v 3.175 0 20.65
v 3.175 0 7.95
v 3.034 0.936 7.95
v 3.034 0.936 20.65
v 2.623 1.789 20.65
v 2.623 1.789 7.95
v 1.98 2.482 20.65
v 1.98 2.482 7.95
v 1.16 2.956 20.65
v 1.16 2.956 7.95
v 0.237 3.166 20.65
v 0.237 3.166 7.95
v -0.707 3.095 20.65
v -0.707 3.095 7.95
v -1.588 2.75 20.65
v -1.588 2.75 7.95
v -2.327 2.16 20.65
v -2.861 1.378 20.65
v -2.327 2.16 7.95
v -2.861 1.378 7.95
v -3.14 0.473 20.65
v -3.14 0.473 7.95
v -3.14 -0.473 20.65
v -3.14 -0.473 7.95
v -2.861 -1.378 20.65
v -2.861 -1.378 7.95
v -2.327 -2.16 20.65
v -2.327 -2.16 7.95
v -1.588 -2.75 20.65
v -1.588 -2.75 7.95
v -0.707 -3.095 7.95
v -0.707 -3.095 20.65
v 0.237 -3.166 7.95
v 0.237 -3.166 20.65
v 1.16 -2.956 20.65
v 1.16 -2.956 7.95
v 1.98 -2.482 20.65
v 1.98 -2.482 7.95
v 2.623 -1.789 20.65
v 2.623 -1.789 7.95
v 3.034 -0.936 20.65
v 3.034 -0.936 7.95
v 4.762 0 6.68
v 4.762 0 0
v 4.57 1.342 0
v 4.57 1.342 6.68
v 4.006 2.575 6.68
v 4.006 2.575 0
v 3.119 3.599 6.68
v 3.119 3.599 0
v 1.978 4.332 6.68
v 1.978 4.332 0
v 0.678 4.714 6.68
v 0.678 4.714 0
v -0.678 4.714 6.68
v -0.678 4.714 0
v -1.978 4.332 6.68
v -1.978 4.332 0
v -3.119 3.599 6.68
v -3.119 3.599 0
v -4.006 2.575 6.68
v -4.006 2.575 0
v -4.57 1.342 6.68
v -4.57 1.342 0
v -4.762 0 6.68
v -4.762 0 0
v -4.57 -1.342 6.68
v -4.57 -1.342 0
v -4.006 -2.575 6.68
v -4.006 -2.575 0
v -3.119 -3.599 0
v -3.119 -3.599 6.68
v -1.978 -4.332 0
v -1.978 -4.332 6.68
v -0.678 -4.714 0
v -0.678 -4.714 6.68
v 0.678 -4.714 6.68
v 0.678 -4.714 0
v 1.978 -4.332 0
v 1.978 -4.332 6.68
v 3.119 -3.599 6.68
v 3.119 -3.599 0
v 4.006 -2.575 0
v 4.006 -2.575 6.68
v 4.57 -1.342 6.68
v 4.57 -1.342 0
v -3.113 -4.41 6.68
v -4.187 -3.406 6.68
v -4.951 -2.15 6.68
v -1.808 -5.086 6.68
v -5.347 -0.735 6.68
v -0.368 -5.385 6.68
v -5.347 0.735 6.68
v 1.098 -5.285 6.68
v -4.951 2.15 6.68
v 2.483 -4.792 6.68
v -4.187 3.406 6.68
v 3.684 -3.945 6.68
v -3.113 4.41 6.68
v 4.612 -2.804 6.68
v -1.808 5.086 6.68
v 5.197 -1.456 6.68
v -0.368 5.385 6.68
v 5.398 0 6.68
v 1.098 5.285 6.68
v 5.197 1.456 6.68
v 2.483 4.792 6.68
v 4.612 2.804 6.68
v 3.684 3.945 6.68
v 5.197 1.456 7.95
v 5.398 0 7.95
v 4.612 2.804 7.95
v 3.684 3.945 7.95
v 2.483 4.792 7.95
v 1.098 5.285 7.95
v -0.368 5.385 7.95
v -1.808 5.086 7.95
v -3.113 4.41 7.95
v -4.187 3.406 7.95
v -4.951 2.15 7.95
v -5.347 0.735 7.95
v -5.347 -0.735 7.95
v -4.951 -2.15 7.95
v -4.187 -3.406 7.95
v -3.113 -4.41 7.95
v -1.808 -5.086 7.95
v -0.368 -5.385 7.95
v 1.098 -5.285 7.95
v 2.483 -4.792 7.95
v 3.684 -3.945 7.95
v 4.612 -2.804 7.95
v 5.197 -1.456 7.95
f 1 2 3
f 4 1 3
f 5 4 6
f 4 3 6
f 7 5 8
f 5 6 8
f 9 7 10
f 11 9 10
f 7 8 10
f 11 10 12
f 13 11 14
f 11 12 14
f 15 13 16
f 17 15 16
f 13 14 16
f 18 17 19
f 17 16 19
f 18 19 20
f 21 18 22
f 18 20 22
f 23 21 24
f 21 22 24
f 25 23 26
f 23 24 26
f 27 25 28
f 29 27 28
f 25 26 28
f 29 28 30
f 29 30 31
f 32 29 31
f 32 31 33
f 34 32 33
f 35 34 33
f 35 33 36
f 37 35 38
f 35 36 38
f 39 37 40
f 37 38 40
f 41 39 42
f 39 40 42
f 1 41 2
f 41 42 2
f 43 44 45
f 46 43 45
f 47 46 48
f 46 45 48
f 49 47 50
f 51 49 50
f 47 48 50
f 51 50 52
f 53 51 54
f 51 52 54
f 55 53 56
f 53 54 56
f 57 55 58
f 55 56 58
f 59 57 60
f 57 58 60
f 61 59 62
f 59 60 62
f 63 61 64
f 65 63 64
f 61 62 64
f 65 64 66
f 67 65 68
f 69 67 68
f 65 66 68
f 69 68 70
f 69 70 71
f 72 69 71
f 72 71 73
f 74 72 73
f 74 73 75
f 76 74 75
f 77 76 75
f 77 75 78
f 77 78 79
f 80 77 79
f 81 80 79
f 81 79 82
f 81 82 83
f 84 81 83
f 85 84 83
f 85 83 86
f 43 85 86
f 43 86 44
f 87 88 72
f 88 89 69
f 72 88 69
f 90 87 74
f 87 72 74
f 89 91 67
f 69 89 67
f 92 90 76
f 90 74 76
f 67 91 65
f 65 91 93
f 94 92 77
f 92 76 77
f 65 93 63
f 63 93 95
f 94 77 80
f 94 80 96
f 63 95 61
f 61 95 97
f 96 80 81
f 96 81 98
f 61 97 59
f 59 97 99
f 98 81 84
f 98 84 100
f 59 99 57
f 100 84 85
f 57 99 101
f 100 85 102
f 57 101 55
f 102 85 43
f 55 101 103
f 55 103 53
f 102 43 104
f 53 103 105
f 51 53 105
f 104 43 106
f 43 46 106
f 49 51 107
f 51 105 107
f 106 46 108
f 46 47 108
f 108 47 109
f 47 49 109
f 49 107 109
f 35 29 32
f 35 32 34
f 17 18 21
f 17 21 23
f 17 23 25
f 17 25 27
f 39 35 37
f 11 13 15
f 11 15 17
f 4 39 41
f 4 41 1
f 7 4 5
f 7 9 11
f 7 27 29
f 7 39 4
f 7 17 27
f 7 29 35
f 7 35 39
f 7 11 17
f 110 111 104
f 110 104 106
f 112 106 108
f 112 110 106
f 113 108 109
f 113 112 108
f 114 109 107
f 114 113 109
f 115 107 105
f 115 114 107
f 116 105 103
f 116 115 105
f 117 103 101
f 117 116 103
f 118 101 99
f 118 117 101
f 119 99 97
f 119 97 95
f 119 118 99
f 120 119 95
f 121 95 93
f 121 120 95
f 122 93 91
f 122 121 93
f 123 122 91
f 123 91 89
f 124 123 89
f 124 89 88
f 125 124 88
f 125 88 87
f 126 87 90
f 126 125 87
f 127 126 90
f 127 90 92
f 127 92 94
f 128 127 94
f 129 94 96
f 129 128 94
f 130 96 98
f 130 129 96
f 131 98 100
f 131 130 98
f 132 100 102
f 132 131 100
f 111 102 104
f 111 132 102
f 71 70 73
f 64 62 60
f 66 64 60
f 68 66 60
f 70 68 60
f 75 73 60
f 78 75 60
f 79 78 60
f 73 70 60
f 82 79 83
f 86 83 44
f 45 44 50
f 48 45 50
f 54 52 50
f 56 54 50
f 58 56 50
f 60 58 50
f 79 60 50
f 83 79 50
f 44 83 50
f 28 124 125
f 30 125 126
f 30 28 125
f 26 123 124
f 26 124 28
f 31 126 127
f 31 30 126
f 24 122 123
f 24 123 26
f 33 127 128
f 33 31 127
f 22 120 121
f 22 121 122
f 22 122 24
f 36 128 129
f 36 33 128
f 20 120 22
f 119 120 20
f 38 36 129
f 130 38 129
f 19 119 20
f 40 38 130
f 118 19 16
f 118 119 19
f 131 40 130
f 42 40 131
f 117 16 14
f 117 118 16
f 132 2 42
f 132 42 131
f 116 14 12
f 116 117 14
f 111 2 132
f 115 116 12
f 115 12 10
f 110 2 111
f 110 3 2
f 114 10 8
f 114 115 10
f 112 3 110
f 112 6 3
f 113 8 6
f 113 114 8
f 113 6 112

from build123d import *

# Parameters (mm, degrees)
F0_R     = 4.7625
F1_DEPTH = 7.9502
F2_R     = 5.3975
F2_R_2   = 4.7625
F3_DEPTH = 1.27
F4_R     = 3.175
F5_DEPTH = 12.7


with BuildPart() as f1:
    # F0 (on Top) → F1 (new body)
    with BuildSketch(Plane.XY):
        Circle(F0_R)
    extrude(amount=F1_DEPTH)

    # F2 (on face) → F3 (join)
    with BuildSketch(Plane.XY.offset(7.9502)):
        Circle(F2_R)
        Circle(F2_R_2, mode=Mode.SUBTRACT)
    extrude(amount=-F3_DEPTH)

    # F4 (on face) → F5 (join)
    with BuildSketch(Plane.XY.offset(7.9502)):
        Circle(F4_R)
    extrude(amount=F5_DEPTH)


solid = f1.part
